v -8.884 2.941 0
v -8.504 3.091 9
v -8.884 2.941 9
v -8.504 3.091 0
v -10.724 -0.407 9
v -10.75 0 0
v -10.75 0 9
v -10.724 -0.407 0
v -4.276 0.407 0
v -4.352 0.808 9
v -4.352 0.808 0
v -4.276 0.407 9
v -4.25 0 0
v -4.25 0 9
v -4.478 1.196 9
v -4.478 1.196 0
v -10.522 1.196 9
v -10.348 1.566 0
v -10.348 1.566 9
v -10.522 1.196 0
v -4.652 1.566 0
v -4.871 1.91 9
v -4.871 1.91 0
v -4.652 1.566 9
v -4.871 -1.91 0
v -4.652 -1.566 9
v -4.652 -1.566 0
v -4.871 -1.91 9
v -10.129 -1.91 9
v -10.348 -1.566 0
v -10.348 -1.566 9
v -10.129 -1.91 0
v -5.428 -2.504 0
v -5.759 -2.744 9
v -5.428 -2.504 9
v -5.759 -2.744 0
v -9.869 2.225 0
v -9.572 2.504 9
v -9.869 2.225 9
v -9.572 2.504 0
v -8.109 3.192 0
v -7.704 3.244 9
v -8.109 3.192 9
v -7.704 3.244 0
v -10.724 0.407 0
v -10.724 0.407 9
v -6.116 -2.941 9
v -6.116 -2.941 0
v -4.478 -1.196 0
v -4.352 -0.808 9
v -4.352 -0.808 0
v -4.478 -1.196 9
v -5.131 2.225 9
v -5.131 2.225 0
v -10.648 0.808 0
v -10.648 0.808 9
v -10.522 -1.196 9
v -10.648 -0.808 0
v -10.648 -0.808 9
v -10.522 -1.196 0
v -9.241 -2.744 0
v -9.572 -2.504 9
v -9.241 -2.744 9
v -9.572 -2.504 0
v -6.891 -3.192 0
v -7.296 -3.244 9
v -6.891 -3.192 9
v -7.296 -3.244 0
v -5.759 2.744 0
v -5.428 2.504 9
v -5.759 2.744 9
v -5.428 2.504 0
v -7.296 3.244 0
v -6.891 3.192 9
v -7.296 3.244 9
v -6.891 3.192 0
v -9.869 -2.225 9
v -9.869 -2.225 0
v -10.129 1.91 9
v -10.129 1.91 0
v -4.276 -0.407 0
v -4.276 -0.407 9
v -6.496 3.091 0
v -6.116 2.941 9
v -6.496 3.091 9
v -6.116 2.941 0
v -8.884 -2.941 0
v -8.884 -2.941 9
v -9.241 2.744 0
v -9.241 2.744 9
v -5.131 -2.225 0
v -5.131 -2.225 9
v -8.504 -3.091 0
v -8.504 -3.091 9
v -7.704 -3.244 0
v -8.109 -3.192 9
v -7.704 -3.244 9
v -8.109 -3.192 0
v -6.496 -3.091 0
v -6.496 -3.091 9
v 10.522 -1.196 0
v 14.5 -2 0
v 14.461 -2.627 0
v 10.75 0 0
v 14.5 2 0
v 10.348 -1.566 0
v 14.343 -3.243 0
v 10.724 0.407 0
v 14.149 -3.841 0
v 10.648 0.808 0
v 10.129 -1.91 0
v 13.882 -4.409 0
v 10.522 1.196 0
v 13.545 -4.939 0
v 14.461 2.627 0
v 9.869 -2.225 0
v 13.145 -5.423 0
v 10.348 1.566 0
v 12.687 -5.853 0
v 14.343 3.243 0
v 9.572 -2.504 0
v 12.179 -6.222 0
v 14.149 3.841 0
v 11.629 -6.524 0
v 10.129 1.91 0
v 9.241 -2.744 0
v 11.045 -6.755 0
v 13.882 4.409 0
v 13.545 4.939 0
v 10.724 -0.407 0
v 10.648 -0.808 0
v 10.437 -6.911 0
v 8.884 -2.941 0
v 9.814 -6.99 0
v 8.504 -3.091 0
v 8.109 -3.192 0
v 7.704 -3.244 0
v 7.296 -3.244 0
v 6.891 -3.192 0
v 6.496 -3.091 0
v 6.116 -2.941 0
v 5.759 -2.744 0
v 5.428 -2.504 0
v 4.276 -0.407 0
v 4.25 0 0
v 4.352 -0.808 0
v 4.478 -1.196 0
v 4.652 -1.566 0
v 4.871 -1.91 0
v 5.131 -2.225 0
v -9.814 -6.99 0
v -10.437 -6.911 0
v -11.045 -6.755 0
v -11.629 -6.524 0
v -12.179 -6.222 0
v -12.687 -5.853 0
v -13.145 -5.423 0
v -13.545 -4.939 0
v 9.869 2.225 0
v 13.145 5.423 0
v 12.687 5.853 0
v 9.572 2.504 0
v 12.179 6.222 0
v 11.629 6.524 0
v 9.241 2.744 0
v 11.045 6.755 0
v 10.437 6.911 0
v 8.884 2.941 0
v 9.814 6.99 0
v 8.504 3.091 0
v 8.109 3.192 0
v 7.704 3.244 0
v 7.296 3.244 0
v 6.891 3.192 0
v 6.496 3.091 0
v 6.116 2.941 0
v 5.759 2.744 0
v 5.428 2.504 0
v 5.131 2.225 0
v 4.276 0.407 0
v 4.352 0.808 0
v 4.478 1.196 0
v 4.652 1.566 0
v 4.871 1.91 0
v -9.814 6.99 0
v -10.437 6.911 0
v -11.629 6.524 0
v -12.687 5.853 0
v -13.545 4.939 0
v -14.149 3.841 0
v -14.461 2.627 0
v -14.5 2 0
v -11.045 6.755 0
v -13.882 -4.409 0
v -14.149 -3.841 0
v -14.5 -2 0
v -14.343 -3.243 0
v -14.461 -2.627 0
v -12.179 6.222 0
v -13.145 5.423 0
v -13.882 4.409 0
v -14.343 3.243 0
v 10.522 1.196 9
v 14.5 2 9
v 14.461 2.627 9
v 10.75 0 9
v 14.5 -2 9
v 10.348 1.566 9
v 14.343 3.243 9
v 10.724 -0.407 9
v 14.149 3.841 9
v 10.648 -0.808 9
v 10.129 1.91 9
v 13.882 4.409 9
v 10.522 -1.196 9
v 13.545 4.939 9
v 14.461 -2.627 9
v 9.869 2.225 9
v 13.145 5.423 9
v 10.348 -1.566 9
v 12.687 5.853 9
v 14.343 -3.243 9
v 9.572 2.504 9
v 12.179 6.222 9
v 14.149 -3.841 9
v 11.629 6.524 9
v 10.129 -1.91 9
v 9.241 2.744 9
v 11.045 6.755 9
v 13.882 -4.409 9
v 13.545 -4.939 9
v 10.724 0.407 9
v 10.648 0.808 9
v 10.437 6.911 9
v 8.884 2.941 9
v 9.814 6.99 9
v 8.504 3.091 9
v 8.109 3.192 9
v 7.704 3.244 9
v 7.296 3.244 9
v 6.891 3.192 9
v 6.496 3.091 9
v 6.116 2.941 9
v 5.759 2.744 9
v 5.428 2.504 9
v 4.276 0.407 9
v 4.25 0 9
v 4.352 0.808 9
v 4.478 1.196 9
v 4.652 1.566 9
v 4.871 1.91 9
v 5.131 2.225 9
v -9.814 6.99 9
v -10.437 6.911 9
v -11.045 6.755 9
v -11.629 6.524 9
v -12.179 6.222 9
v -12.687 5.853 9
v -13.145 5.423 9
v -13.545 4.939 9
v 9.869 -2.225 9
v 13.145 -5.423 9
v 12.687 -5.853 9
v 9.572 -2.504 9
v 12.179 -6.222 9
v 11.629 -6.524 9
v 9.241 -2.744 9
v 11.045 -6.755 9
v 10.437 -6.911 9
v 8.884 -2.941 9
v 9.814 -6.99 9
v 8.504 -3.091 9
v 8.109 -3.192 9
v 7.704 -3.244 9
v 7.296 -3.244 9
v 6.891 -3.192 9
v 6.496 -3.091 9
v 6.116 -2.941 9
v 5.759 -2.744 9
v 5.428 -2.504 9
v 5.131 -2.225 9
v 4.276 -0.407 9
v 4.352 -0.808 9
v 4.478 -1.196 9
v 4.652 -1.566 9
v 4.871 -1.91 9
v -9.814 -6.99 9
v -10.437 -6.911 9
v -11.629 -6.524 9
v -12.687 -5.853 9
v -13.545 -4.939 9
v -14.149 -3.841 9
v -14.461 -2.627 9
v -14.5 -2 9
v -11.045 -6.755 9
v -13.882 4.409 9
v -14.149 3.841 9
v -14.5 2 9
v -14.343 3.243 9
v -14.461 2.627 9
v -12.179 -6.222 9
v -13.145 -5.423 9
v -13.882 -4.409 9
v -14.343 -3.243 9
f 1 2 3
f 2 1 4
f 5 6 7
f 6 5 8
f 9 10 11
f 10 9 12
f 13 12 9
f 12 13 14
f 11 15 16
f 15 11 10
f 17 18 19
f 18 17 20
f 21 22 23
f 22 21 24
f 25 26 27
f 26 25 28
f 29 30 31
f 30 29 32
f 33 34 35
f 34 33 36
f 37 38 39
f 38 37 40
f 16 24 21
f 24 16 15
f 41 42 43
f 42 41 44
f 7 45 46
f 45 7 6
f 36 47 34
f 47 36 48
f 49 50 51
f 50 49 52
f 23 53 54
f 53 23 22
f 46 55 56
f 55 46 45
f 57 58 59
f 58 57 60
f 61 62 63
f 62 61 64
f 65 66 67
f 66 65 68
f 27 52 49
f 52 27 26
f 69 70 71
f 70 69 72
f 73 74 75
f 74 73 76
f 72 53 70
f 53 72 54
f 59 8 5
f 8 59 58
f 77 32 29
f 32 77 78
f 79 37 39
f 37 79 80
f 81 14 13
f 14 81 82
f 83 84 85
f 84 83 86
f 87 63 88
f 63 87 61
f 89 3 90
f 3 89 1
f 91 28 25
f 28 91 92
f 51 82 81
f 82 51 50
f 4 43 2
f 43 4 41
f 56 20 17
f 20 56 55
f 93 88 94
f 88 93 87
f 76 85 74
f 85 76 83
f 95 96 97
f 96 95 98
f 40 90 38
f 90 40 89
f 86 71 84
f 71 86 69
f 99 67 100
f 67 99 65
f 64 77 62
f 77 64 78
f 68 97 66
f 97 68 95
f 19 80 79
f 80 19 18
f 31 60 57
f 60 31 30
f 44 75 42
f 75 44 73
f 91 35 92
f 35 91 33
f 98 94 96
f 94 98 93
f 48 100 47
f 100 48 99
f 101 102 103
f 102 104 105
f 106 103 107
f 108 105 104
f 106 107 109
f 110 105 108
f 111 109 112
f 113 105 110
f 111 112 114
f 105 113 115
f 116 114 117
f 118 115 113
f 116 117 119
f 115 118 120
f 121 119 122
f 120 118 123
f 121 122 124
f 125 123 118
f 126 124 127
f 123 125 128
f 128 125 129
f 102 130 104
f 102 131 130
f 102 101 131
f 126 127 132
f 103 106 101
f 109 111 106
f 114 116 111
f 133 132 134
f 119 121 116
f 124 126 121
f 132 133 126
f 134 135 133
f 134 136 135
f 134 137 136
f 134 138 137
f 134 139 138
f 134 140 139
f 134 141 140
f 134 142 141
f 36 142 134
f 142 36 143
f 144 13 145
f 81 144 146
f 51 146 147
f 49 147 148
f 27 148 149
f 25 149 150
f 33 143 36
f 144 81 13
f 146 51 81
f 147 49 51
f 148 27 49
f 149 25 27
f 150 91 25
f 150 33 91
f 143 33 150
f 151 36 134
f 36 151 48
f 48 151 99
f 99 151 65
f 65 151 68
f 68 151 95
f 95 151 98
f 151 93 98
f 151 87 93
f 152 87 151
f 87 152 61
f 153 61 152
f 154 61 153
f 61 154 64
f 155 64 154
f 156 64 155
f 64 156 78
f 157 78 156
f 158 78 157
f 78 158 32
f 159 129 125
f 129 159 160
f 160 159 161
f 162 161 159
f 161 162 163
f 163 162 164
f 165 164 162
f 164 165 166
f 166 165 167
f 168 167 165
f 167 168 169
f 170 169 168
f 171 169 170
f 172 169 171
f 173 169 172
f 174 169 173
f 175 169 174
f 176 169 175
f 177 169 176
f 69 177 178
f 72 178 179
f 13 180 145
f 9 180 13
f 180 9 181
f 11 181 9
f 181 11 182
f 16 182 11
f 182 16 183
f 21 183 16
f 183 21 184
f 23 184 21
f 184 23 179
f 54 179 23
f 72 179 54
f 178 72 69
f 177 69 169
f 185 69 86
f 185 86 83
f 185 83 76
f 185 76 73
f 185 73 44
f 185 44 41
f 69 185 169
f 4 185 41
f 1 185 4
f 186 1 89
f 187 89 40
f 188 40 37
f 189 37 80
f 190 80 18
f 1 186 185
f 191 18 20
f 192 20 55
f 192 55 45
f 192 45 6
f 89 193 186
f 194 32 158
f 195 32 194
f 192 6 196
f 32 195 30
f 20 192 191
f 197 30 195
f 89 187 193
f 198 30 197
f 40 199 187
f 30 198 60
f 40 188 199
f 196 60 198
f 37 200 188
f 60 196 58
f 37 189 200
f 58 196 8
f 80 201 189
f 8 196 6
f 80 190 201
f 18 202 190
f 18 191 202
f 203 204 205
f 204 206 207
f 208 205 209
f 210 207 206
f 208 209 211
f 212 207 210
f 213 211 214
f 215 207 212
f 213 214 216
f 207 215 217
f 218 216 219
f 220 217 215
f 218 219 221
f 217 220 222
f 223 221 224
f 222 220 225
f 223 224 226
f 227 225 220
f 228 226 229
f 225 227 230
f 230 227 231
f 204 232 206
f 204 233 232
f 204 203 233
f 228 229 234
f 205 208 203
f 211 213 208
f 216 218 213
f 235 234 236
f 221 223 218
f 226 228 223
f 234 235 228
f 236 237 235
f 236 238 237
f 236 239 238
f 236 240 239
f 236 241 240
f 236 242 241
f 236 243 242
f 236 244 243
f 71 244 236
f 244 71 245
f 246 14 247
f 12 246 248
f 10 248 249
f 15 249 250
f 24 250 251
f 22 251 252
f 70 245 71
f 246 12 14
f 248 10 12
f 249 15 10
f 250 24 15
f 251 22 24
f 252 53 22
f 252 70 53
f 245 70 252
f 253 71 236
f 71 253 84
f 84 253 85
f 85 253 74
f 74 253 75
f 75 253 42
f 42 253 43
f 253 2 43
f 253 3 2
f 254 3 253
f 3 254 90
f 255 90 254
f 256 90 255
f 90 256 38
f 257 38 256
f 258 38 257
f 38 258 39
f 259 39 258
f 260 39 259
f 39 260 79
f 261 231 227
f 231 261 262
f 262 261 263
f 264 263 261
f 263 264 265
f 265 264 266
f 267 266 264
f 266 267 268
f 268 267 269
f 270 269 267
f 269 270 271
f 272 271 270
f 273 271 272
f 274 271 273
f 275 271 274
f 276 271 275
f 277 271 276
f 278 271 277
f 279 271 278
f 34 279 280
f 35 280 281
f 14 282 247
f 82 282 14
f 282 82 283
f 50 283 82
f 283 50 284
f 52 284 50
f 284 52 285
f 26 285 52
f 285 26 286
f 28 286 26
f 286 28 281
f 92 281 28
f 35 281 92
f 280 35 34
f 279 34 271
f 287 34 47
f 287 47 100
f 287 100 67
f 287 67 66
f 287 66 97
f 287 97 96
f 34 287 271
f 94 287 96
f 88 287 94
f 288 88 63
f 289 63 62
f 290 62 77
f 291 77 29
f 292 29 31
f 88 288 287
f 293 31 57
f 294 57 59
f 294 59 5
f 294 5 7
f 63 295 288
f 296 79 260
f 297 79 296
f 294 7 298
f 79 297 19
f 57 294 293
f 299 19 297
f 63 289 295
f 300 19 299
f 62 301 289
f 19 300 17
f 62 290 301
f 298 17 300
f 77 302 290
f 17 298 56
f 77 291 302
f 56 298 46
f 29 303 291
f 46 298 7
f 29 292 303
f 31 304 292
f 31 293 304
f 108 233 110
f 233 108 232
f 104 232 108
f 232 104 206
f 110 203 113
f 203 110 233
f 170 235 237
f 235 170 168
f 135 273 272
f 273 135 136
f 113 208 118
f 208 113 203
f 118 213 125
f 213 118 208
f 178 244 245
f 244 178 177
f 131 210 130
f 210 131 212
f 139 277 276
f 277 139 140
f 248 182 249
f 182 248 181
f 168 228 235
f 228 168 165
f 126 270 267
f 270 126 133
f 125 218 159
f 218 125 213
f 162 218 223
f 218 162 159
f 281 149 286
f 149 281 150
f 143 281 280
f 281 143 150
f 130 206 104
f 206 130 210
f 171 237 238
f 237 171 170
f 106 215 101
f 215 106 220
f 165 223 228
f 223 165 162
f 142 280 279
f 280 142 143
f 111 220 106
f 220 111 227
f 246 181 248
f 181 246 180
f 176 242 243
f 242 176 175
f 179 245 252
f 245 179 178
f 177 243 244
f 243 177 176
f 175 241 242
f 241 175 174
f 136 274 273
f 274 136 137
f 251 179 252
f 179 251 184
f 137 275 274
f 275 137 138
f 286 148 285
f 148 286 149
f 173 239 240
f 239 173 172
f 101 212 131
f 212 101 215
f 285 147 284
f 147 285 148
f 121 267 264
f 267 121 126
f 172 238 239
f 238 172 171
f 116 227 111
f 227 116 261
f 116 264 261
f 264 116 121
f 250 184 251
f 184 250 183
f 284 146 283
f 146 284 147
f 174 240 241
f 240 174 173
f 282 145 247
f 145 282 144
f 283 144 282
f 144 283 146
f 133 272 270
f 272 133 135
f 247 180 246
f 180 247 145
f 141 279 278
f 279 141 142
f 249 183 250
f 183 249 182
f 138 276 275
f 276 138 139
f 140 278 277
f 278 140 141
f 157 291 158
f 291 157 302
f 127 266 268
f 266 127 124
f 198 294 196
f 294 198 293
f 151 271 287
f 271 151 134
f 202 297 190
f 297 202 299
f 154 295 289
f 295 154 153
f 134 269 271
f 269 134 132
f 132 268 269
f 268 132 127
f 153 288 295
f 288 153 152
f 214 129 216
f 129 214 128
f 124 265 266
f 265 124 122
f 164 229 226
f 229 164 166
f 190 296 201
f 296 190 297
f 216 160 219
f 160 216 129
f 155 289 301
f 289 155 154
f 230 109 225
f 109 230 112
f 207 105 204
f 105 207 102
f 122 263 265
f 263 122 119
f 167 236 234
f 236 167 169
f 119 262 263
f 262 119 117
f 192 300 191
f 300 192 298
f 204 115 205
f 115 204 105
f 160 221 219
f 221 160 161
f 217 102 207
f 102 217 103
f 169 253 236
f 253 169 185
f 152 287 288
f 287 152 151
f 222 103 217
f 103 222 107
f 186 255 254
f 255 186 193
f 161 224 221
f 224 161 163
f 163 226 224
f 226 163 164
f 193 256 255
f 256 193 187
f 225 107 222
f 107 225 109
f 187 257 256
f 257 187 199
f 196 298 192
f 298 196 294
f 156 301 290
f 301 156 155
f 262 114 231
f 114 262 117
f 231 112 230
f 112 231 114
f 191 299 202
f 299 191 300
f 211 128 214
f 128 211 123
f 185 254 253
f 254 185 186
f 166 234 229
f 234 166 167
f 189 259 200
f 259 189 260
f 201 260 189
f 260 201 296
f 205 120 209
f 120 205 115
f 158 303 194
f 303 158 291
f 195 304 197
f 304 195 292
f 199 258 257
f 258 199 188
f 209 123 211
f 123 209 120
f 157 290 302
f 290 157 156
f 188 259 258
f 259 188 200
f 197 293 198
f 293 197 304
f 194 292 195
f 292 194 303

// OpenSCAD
$fn = 50;


difference() {
	union() {
		hull() {
			translate(v = [-9.5000000000, 2.0000000000, 0]) {
				cylinder(h = 9, r = 5);
			}
			translate(v = [9.5000000000, 2.0000000000, 0]) {
				cylinder(h = 9, r = 5);
			}
			translate(v = [-9.5000000000, -2.0000000000, 0]) {
				cylinder(h = 9, r = 5);
			}
			translate(v = [9.5000000000, -2.0000000000, 0]) {
				cylinder(h = 9, r = 5);
			}
		}
	}
	union() {
		translate(v = [-7.5000000000, 0.0000000000, 0]) {
			cylinder(h = 9, r = 3.2500000000);
		}
		translate(v = [7.5000000000, 0.0000000000, 0]) {
			cylinder(h = 9, r = 3.2500000000);
		}
		translate(v = [-7.5000000000, 0.0000000000, 0]) {
			cylinder(h = 9, r = 1.8000000000);
		}
		translate(v = [7.5000000000, 0.0000000000, 0]) {
			cylinder(h = 9, r = 1.8000000000);
		}
		translate(v = [-7.5000000000, 0.0000000000, 0]) {
			cylinder(h = 9, r = 1.8000000000);
		}
		translate(v = [7.5000000000, 0.0000000000, 0]) {
			cylinder(h = 9, r = 1.8000000000);
		}
		translate(v = [-7.5000000000, 0.0000000000, 0]) {
			cylinder(h = 9, r = 1.8000000000);
		}
		translate(v = [7.5000000000, 0.0000000000, 0]) {
			cylinder(h = 9, r = 1.8000000000);
		}
	}
}
